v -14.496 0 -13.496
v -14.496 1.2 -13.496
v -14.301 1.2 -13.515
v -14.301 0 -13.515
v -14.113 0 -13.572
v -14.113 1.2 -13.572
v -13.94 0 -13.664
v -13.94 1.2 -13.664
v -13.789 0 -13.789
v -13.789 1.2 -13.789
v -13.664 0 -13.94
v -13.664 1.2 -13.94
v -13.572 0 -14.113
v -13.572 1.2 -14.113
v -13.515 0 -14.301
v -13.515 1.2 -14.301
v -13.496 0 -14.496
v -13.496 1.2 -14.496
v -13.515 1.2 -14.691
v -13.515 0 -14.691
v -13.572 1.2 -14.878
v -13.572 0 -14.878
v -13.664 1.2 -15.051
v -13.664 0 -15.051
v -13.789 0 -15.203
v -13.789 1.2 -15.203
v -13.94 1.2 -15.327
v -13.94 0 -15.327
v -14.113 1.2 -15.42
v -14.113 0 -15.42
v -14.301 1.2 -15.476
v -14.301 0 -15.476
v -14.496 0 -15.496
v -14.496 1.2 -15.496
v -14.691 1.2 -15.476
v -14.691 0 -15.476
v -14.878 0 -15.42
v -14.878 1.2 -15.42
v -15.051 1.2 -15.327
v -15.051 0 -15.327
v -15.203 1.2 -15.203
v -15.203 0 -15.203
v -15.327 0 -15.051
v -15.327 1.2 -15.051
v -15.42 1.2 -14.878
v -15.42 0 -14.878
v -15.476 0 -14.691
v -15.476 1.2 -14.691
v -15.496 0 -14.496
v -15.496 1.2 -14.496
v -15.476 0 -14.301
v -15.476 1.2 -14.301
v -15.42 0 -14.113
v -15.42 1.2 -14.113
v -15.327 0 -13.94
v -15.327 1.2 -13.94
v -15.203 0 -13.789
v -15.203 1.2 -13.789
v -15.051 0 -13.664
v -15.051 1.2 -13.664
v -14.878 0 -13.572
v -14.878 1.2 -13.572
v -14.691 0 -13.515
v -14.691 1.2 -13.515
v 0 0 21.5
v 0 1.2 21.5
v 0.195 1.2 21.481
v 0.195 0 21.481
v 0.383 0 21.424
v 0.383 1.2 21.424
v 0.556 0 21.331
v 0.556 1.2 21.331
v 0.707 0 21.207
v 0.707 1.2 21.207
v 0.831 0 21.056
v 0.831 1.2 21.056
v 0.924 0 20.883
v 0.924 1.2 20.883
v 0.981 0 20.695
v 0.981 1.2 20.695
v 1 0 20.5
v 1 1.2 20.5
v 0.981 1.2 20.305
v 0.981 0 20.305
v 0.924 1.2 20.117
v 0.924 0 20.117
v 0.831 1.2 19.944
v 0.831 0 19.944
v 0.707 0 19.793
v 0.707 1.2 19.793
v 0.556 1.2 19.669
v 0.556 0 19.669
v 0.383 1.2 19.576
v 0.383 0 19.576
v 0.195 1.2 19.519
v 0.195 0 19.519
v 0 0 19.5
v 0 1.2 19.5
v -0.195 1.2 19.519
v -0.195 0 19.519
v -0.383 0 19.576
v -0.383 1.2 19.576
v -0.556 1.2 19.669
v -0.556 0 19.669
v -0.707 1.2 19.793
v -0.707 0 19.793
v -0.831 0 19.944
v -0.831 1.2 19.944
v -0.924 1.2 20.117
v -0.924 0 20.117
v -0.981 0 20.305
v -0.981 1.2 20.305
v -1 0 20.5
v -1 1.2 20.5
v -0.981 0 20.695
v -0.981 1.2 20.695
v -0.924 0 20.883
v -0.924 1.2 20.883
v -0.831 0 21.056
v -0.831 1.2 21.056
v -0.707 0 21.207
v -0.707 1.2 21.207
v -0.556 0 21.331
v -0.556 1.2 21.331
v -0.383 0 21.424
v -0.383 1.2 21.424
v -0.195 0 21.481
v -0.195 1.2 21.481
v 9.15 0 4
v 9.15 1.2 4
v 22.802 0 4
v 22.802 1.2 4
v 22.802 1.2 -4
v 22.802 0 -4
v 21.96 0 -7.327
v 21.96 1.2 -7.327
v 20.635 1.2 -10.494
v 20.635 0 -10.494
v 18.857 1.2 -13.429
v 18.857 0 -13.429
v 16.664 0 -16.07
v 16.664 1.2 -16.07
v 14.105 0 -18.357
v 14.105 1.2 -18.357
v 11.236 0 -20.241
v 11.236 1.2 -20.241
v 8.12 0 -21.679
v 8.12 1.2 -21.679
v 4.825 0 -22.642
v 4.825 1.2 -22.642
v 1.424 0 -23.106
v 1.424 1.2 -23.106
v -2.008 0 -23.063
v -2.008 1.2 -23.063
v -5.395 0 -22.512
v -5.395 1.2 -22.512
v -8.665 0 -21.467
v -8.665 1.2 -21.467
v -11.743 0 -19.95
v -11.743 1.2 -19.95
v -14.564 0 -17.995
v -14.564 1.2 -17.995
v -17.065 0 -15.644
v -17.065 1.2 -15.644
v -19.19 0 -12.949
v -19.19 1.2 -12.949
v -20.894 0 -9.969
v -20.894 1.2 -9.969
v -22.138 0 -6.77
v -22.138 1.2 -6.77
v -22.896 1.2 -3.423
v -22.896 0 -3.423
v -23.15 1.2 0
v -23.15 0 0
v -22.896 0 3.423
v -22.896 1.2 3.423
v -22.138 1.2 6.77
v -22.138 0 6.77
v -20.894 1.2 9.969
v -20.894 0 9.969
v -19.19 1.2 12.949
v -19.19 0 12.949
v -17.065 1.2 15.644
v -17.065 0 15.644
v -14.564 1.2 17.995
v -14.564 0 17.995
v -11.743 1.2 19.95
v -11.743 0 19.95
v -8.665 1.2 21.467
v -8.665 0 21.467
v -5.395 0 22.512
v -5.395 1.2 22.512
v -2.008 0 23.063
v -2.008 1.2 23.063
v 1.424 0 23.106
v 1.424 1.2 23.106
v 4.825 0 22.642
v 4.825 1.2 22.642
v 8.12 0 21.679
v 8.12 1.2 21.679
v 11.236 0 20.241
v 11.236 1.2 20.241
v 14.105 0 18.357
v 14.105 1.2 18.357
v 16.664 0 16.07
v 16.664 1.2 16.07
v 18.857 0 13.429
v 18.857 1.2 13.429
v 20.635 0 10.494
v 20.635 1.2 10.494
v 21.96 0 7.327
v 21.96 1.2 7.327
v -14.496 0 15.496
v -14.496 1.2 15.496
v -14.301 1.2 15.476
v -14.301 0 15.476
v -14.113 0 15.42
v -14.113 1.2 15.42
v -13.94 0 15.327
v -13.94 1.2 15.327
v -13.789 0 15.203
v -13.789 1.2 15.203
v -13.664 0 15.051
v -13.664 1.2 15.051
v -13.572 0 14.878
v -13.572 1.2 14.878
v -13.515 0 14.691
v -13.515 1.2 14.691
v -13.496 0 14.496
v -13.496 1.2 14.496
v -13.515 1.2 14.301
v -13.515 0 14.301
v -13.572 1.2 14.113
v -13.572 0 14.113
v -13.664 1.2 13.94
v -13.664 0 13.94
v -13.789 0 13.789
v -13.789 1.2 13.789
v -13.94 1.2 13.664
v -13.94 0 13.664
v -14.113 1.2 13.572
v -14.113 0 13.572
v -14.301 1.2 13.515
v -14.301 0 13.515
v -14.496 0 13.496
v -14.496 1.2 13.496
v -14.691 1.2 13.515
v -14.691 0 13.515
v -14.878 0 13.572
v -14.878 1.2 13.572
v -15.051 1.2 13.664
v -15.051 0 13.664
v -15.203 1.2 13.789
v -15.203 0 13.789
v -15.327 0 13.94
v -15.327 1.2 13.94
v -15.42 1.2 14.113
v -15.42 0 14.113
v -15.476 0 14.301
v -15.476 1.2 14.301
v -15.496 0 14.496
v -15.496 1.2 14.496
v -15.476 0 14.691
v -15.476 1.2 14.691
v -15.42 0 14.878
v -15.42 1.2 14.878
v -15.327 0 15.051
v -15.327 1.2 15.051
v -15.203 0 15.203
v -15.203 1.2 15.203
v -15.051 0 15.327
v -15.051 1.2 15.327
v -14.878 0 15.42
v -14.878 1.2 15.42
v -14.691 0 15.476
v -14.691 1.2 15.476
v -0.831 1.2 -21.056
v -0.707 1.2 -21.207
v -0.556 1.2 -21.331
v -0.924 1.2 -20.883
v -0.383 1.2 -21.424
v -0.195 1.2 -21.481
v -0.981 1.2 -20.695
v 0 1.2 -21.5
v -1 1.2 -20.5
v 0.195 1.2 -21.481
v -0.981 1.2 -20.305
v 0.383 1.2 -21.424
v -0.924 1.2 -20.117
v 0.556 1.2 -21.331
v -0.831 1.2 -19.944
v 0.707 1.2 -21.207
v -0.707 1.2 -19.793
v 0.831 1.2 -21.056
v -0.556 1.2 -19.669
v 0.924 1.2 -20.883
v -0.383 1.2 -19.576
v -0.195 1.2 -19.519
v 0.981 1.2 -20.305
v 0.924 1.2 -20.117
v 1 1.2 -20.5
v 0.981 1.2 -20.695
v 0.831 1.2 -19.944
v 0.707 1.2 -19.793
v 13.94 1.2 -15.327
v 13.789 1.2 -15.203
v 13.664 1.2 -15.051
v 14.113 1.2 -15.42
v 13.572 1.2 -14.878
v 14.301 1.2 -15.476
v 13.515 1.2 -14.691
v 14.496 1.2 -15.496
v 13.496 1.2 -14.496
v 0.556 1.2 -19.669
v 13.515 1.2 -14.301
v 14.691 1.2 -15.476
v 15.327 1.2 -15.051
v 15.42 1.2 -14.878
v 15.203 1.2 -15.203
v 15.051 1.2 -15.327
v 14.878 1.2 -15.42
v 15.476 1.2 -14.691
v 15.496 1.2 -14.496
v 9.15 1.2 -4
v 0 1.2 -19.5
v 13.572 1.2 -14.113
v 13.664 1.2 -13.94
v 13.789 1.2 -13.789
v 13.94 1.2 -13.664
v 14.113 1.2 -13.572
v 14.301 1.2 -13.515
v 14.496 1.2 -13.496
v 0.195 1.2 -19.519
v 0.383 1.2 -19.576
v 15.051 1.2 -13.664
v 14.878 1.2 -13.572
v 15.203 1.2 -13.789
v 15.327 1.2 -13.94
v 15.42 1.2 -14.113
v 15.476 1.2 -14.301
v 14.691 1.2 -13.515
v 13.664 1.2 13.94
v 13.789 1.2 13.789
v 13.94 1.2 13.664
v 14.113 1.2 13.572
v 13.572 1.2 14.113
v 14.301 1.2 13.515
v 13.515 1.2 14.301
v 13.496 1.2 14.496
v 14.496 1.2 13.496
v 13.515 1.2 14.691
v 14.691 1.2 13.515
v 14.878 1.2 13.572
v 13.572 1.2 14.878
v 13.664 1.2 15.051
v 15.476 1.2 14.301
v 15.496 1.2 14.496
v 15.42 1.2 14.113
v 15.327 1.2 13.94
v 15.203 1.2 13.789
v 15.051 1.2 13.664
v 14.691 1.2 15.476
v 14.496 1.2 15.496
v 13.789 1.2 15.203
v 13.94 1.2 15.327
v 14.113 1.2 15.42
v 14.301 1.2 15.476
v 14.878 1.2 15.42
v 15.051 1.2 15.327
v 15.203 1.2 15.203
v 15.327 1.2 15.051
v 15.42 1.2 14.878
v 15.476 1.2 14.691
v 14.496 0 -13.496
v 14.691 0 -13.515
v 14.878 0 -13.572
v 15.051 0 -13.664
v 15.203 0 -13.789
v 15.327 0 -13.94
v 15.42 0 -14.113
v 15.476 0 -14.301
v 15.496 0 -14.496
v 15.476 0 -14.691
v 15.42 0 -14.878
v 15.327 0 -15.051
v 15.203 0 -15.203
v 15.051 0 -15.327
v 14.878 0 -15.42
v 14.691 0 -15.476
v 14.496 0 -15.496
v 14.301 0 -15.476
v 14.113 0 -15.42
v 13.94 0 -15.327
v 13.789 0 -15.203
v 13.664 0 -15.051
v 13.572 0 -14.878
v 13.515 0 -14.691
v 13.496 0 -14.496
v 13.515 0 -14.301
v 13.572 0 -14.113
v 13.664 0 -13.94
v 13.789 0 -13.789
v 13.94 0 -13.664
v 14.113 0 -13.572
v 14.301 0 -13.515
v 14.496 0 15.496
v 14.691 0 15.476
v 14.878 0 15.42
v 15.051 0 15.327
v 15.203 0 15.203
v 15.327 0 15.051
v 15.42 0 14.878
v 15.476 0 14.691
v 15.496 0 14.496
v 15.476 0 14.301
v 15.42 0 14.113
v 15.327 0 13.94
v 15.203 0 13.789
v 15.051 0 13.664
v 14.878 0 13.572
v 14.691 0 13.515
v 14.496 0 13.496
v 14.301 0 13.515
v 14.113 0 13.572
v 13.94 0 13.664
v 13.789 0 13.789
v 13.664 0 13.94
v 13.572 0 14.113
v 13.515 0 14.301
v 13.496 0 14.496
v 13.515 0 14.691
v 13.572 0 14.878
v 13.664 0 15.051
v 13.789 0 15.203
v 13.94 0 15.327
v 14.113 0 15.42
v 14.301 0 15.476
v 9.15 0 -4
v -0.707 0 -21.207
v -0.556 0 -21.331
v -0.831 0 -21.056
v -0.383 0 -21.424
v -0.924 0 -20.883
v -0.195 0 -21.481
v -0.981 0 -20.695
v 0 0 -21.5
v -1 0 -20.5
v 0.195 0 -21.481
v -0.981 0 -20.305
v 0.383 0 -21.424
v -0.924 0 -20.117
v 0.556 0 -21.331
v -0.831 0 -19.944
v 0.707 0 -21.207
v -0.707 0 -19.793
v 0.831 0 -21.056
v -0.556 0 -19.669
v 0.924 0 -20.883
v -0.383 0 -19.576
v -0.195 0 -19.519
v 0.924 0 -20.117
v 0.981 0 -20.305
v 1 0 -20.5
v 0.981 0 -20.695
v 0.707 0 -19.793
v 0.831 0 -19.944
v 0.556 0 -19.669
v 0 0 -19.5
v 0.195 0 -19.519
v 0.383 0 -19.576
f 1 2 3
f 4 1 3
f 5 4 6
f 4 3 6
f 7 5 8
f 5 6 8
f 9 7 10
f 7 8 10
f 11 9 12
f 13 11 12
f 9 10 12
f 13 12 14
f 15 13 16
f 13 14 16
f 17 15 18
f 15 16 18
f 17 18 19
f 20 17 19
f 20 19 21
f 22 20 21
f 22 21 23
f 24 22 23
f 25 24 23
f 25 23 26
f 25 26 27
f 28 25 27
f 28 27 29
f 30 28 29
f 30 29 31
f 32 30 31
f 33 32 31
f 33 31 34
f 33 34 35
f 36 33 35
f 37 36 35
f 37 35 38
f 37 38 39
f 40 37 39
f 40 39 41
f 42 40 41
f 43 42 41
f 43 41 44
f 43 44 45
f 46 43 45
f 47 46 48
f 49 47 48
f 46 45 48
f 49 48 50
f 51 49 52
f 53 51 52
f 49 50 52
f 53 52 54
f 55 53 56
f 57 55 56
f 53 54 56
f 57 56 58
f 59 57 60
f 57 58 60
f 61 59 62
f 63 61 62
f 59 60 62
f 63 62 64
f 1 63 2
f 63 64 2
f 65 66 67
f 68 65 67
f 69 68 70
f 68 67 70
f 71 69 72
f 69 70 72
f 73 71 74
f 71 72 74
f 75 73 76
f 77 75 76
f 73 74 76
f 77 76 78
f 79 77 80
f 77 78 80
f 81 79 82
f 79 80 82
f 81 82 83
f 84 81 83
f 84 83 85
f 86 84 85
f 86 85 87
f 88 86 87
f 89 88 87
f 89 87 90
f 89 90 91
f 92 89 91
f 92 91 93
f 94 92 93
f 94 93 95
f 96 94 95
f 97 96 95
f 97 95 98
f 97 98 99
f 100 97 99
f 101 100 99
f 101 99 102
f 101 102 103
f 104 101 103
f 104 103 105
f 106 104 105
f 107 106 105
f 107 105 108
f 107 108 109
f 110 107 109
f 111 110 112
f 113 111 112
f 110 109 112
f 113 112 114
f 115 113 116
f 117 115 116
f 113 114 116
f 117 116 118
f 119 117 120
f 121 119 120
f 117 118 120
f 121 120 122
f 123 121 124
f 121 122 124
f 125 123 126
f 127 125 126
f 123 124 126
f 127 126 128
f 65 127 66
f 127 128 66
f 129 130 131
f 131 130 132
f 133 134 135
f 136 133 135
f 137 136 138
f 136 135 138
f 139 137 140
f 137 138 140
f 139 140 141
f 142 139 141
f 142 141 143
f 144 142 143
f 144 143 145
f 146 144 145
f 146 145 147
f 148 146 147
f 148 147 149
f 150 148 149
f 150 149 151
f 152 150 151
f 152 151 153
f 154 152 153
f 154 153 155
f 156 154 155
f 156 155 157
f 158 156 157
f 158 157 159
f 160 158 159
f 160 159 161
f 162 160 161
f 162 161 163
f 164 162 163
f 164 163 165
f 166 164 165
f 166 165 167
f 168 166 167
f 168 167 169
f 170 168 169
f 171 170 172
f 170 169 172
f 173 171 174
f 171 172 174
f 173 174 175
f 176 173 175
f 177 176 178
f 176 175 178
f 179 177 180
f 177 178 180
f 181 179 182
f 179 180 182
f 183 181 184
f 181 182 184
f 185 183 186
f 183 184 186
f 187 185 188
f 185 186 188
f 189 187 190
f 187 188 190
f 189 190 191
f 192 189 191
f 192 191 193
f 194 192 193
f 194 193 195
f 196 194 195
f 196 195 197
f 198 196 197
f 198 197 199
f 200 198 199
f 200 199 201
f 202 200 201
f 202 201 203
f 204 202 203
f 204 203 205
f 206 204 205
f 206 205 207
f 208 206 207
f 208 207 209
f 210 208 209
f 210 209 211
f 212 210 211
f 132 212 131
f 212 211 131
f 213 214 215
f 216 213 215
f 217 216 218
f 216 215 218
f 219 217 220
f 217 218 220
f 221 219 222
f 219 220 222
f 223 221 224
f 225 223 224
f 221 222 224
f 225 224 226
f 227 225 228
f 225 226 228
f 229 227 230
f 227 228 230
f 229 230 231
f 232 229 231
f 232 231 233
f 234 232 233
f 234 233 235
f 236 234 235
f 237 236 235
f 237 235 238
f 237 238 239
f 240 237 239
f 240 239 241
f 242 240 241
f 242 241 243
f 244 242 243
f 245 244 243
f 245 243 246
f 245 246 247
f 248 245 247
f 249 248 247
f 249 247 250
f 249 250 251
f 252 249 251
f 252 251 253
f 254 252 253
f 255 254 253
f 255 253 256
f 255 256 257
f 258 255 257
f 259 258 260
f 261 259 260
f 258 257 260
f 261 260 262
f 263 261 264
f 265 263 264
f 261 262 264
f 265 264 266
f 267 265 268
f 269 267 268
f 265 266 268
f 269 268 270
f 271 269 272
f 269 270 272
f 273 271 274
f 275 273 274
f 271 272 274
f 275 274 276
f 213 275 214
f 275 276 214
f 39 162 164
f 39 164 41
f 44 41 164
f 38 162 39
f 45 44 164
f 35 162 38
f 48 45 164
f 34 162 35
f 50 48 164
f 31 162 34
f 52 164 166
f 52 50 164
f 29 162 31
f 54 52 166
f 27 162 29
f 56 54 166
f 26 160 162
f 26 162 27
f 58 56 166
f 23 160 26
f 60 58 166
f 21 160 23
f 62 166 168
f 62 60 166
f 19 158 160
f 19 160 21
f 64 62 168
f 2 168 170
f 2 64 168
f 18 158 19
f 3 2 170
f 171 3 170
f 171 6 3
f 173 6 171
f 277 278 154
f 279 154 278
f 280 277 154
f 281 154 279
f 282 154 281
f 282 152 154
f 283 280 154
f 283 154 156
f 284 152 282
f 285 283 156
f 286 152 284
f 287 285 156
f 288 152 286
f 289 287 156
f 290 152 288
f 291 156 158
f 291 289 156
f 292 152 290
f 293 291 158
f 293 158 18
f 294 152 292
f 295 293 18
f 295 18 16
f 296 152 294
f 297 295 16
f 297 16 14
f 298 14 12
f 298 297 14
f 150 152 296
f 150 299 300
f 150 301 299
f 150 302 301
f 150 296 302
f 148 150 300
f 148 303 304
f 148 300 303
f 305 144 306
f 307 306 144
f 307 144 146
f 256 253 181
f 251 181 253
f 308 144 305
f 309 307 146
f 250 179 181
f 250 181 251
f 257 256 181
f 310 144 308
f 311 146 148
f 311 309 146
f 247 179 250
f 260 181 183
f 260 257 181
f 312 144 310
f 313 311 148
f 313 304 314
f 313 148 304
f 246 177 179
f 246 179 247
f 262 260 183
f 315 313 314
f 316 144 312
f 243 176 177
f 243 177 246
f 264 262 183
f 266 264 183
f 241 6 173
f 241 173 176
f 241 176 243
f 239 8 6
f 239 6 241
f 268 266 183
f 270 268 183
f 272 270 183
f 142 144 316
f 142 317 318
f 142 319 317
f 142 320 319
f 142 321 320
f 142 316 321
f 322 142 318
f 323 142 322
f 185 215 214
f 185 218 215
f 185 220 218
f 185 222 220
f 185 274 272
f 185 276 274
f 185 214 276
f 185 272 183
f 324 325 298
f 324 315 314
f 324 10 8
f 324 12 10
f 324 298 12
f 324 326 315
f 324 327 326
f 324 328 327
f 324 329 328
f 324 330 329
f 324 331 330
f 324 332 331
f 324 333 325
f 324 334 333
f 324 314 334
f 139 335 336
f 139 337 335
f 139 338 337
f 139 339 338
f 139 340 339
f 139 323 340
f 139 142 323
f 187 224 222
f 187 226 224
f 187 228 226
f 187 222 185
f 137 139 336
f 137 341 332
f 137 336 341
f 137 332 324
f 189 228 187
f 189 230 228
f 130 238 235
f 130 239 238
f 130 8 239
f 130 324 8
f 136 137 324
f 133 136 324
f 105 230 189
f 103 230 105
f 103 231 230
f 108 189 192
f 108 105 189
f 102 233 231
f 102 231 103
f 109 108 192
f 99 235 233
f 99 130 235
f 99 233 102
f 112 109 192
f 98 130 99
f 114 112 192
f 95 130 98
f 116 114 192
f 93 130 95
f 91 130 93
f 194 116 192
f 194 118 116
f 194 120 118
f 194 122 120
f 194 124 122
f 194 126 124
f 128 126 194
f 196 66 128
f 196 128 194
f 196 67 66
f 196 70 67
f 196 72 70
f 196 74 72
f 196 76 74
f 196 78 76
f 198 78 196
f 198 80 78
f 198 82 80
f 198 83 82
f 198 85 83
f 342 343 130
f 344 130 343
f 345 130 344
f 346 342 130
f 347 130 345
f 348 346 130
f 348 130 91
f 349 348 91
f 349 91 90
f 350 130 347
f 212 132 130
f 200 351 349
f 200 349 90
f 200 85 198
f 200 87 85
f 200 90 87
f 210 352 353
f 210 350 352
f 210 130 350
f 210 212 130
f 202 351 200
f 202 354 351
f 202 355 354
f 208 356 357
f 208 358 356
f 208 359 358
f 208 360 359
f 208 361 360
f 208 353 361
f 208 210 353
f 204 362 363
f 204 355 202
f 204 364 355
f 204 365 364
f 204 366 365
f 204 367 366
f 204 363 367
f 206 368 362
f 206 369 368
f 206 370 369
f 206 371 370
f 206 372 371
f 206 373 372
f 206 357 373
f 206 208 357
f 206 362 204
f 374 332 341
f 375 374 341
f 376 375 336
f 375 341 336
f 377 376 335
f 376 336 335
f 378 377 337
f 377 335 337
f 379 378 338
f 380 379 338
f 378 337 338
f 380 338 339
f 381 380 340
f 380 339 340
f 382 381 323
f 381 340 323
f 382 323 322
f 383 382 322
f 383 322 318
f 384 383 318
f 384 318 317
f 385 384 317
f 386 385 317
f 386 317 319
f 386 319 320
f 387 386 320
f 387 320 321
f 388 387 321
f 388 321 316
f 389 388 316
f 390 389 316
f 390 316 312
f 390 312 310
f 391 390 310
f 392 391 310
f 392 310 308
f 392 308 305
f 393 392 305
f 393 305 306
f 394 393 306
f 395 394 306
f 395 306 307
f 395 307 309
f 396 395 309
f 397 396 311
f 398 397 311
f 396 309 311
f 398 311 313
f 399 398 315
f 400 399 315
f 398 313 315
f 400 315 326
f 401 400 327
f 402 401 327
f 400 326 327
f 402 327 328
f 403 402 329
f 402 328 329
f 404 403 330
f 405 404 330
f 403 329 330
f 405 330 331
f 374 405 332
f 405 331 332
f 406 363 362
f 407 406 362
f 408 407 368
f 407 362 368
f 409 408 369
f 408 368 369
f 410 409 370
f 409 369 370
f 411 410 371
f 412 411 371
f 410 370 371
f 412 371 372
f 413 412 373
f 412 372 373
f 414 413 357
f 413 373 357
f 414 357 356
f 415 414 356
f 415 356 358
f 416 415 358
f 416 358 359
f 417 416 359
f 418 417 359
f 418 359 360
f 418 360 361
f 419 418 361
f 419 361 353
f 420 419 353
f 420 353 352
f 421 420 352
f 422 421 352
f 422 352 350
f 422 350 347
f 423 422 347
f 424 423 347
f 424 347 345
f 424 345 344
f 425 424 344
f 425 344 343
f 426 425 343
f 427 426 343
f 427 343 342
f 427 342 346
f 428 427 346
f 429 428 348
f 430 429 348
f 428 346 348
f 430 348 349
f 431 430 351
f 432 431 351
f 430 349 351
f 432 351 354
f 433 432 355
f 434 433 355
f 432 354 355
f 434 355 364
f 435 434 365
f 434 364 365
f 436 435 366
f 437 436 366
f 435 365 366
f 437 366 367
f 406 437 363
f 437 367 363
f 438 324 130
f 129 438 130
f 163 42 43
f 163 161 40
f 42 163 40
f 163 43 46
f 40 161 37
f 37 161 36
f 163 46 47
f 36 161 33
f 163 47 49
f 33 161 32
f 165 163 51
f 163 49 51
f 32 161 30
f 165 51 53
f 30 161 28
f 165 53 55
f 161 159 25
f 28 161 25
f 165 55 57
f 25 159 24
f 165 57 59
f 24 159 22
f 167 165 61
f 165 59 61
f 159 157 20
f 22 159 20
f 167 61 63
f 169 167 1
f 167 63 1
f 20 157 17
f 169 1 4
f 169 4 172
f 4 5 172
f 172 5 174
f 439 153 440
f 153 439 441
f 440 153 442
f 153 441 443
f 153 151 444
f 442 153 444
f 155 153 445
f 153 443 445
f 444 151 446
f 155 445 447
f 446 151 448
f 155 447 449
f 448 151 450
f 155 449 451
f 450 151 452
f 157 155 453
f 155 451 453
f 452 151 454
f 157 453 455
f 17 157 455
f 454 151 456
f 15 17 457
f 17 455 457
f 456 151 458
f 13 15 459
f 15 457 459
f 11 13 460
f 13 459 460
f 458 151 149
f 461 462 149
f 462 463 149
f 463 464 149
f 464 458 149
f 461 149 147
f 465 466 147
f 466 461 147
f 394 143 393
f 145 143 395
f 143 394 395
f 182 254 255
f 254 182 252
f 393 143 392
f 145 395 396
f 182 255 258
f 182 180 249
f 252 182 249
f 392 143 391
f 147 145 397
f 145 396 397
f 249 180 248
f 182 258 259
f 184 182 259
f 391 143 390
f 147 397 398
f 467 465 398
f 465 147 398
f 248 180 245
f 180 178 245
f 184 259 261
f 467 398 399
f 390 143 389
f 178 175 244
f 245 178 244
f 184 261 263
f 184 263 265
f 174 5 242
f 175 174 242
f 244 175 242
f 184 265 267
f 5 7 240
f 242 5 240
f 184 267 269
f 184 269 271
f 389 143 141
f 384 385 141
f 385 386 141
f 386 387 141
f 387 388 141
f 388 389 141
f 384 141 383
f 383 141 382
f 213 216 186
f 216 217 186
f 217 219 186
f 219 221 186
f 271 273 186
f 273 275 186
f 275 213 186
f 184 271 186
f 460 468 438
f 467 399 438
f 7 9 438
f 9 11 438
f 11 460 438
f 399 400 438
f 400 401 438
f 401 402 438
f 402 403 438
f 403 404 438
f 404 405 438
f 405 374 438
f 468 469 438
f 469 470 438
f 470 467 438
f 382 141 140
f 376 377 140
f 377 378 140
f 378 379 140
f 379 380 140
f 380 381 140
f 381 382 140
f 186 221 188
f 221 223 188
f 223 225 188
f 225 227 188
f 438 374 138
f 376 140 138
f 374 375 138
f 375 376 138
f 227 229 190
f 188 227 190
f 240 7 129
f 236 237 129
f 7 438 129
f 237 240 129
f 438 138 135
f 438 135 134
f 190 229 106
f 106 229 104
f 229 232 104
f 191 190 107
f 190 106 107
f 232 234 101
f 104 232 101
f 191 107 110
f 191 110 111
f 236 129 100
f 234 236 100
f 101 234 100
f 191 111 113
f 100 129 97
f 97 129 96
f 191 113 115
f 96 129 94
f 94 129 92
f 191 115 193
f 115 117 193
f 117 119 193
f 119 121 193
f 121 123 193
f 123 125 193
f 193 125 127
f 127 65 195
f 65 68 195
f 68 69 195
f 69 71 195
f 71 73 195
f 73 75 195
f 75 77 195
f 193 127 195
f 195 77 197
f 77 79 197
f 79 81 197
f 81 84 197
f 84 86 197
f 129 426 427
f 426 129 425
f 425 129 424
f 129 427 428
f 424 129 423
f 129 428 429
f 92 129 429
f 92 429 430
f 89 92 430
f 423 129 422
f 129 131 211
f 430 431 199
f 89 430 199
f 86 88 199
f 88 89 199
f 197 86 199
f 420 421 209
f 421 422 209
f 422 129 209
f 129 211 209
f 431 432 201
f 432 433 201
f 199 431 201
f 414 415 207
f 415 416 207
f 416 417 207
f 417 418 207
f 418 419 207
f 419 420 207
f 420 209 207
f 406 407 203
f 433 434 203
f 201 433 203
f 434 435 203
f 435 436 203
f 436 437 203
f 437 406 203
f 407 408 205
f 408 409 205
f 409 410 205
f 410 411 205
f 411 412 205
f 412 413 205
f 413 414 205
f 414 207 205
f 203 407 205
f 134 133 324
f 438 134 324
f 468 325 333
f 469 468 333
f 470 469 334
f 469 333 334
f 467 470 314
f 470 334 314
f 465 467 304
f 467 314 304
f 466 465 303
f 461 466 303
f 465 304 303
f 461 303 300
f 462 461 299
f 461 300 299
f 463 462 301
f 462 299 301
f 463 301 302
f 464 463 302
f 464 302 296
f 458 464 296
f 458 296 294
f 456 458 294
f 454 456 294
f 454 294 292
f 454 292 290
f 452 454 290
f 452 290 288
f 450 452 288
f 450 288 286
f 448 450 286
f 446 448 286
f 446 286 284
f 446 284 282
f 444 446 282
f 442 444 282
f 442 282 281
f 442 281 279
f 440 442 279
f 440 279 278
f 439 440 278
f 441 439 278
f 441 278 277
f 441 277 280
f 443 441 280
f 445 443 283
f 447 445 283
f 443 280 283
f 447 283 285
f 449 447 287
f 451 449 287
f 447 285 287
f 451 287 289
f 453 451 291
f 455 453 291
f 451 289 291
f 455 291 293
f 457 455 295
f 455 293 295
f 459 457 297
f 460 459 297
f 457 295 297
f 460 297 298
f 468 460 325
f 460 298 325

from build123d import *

# Parameters (mm, degrees)
SKETCH_1_R          = 23.15
EXTRUDE_1_DEPTH     = 1.2
SKETCH_2_R          = 1
CUT_EXTRUDE_1_DEPTH = 1.6


with BuildPart() as part:
    # 草图1 → 凸台-拉伸1 (new body)
    with BuildSketch(Plane(origin=(0, 0, 0), x_dir=(1, 0, 0), z_dir=(0, 1, 0))):
        with Locations(Location((0, 0, 0), (0, 0, 270))):
            Circle(SKETCH_1_R)
    extrude(amount=EXTRUDE_1_DEPTH)

    # 草图2 → 切除-拉伸1 (cut)
    with BuildSketch(Plane(origin=(0, 1.2, 0), x_dir=(1, 0, 0), z_dir=(0, 1, 0))):
        with Locations(Location((0, 20.5, 0), (0, 0, 270))):
            Circle(SKETCH_2_R)
        with Locations(Location((14.495689014, 14.495689014, 0), (0, 0, 270))):
            Circle(SKETCH_2_R)
        with Locations(Location((14.495689014, -14.495689014, 0), (0, 0, 270))):
            Circle(SKETCH_2_R)
        with Locations(Location((0, -20.5, 0), (0, 0, 270))):
            Circle(SKETCH_2_R)
        with Locations(Location((-14.495689014, -14.495689014, 0), (0, 0, 270))):
            Circle(SKETCH_2_R)
        with Locations(Location((-14.495689014, 14.495689014, 0), (0, 0, 270))):
            Circle(SKETCH_2_R)
        Polygon((23.15, 0), (23.15, 4), (9.15, 4), (9.15, -4), (23.15, -4), align=None)
    extrude(amount=-CUT_EXTRUDE_1_DEPTH, mode=Mode.SUBTRACT)


solid = part.part
